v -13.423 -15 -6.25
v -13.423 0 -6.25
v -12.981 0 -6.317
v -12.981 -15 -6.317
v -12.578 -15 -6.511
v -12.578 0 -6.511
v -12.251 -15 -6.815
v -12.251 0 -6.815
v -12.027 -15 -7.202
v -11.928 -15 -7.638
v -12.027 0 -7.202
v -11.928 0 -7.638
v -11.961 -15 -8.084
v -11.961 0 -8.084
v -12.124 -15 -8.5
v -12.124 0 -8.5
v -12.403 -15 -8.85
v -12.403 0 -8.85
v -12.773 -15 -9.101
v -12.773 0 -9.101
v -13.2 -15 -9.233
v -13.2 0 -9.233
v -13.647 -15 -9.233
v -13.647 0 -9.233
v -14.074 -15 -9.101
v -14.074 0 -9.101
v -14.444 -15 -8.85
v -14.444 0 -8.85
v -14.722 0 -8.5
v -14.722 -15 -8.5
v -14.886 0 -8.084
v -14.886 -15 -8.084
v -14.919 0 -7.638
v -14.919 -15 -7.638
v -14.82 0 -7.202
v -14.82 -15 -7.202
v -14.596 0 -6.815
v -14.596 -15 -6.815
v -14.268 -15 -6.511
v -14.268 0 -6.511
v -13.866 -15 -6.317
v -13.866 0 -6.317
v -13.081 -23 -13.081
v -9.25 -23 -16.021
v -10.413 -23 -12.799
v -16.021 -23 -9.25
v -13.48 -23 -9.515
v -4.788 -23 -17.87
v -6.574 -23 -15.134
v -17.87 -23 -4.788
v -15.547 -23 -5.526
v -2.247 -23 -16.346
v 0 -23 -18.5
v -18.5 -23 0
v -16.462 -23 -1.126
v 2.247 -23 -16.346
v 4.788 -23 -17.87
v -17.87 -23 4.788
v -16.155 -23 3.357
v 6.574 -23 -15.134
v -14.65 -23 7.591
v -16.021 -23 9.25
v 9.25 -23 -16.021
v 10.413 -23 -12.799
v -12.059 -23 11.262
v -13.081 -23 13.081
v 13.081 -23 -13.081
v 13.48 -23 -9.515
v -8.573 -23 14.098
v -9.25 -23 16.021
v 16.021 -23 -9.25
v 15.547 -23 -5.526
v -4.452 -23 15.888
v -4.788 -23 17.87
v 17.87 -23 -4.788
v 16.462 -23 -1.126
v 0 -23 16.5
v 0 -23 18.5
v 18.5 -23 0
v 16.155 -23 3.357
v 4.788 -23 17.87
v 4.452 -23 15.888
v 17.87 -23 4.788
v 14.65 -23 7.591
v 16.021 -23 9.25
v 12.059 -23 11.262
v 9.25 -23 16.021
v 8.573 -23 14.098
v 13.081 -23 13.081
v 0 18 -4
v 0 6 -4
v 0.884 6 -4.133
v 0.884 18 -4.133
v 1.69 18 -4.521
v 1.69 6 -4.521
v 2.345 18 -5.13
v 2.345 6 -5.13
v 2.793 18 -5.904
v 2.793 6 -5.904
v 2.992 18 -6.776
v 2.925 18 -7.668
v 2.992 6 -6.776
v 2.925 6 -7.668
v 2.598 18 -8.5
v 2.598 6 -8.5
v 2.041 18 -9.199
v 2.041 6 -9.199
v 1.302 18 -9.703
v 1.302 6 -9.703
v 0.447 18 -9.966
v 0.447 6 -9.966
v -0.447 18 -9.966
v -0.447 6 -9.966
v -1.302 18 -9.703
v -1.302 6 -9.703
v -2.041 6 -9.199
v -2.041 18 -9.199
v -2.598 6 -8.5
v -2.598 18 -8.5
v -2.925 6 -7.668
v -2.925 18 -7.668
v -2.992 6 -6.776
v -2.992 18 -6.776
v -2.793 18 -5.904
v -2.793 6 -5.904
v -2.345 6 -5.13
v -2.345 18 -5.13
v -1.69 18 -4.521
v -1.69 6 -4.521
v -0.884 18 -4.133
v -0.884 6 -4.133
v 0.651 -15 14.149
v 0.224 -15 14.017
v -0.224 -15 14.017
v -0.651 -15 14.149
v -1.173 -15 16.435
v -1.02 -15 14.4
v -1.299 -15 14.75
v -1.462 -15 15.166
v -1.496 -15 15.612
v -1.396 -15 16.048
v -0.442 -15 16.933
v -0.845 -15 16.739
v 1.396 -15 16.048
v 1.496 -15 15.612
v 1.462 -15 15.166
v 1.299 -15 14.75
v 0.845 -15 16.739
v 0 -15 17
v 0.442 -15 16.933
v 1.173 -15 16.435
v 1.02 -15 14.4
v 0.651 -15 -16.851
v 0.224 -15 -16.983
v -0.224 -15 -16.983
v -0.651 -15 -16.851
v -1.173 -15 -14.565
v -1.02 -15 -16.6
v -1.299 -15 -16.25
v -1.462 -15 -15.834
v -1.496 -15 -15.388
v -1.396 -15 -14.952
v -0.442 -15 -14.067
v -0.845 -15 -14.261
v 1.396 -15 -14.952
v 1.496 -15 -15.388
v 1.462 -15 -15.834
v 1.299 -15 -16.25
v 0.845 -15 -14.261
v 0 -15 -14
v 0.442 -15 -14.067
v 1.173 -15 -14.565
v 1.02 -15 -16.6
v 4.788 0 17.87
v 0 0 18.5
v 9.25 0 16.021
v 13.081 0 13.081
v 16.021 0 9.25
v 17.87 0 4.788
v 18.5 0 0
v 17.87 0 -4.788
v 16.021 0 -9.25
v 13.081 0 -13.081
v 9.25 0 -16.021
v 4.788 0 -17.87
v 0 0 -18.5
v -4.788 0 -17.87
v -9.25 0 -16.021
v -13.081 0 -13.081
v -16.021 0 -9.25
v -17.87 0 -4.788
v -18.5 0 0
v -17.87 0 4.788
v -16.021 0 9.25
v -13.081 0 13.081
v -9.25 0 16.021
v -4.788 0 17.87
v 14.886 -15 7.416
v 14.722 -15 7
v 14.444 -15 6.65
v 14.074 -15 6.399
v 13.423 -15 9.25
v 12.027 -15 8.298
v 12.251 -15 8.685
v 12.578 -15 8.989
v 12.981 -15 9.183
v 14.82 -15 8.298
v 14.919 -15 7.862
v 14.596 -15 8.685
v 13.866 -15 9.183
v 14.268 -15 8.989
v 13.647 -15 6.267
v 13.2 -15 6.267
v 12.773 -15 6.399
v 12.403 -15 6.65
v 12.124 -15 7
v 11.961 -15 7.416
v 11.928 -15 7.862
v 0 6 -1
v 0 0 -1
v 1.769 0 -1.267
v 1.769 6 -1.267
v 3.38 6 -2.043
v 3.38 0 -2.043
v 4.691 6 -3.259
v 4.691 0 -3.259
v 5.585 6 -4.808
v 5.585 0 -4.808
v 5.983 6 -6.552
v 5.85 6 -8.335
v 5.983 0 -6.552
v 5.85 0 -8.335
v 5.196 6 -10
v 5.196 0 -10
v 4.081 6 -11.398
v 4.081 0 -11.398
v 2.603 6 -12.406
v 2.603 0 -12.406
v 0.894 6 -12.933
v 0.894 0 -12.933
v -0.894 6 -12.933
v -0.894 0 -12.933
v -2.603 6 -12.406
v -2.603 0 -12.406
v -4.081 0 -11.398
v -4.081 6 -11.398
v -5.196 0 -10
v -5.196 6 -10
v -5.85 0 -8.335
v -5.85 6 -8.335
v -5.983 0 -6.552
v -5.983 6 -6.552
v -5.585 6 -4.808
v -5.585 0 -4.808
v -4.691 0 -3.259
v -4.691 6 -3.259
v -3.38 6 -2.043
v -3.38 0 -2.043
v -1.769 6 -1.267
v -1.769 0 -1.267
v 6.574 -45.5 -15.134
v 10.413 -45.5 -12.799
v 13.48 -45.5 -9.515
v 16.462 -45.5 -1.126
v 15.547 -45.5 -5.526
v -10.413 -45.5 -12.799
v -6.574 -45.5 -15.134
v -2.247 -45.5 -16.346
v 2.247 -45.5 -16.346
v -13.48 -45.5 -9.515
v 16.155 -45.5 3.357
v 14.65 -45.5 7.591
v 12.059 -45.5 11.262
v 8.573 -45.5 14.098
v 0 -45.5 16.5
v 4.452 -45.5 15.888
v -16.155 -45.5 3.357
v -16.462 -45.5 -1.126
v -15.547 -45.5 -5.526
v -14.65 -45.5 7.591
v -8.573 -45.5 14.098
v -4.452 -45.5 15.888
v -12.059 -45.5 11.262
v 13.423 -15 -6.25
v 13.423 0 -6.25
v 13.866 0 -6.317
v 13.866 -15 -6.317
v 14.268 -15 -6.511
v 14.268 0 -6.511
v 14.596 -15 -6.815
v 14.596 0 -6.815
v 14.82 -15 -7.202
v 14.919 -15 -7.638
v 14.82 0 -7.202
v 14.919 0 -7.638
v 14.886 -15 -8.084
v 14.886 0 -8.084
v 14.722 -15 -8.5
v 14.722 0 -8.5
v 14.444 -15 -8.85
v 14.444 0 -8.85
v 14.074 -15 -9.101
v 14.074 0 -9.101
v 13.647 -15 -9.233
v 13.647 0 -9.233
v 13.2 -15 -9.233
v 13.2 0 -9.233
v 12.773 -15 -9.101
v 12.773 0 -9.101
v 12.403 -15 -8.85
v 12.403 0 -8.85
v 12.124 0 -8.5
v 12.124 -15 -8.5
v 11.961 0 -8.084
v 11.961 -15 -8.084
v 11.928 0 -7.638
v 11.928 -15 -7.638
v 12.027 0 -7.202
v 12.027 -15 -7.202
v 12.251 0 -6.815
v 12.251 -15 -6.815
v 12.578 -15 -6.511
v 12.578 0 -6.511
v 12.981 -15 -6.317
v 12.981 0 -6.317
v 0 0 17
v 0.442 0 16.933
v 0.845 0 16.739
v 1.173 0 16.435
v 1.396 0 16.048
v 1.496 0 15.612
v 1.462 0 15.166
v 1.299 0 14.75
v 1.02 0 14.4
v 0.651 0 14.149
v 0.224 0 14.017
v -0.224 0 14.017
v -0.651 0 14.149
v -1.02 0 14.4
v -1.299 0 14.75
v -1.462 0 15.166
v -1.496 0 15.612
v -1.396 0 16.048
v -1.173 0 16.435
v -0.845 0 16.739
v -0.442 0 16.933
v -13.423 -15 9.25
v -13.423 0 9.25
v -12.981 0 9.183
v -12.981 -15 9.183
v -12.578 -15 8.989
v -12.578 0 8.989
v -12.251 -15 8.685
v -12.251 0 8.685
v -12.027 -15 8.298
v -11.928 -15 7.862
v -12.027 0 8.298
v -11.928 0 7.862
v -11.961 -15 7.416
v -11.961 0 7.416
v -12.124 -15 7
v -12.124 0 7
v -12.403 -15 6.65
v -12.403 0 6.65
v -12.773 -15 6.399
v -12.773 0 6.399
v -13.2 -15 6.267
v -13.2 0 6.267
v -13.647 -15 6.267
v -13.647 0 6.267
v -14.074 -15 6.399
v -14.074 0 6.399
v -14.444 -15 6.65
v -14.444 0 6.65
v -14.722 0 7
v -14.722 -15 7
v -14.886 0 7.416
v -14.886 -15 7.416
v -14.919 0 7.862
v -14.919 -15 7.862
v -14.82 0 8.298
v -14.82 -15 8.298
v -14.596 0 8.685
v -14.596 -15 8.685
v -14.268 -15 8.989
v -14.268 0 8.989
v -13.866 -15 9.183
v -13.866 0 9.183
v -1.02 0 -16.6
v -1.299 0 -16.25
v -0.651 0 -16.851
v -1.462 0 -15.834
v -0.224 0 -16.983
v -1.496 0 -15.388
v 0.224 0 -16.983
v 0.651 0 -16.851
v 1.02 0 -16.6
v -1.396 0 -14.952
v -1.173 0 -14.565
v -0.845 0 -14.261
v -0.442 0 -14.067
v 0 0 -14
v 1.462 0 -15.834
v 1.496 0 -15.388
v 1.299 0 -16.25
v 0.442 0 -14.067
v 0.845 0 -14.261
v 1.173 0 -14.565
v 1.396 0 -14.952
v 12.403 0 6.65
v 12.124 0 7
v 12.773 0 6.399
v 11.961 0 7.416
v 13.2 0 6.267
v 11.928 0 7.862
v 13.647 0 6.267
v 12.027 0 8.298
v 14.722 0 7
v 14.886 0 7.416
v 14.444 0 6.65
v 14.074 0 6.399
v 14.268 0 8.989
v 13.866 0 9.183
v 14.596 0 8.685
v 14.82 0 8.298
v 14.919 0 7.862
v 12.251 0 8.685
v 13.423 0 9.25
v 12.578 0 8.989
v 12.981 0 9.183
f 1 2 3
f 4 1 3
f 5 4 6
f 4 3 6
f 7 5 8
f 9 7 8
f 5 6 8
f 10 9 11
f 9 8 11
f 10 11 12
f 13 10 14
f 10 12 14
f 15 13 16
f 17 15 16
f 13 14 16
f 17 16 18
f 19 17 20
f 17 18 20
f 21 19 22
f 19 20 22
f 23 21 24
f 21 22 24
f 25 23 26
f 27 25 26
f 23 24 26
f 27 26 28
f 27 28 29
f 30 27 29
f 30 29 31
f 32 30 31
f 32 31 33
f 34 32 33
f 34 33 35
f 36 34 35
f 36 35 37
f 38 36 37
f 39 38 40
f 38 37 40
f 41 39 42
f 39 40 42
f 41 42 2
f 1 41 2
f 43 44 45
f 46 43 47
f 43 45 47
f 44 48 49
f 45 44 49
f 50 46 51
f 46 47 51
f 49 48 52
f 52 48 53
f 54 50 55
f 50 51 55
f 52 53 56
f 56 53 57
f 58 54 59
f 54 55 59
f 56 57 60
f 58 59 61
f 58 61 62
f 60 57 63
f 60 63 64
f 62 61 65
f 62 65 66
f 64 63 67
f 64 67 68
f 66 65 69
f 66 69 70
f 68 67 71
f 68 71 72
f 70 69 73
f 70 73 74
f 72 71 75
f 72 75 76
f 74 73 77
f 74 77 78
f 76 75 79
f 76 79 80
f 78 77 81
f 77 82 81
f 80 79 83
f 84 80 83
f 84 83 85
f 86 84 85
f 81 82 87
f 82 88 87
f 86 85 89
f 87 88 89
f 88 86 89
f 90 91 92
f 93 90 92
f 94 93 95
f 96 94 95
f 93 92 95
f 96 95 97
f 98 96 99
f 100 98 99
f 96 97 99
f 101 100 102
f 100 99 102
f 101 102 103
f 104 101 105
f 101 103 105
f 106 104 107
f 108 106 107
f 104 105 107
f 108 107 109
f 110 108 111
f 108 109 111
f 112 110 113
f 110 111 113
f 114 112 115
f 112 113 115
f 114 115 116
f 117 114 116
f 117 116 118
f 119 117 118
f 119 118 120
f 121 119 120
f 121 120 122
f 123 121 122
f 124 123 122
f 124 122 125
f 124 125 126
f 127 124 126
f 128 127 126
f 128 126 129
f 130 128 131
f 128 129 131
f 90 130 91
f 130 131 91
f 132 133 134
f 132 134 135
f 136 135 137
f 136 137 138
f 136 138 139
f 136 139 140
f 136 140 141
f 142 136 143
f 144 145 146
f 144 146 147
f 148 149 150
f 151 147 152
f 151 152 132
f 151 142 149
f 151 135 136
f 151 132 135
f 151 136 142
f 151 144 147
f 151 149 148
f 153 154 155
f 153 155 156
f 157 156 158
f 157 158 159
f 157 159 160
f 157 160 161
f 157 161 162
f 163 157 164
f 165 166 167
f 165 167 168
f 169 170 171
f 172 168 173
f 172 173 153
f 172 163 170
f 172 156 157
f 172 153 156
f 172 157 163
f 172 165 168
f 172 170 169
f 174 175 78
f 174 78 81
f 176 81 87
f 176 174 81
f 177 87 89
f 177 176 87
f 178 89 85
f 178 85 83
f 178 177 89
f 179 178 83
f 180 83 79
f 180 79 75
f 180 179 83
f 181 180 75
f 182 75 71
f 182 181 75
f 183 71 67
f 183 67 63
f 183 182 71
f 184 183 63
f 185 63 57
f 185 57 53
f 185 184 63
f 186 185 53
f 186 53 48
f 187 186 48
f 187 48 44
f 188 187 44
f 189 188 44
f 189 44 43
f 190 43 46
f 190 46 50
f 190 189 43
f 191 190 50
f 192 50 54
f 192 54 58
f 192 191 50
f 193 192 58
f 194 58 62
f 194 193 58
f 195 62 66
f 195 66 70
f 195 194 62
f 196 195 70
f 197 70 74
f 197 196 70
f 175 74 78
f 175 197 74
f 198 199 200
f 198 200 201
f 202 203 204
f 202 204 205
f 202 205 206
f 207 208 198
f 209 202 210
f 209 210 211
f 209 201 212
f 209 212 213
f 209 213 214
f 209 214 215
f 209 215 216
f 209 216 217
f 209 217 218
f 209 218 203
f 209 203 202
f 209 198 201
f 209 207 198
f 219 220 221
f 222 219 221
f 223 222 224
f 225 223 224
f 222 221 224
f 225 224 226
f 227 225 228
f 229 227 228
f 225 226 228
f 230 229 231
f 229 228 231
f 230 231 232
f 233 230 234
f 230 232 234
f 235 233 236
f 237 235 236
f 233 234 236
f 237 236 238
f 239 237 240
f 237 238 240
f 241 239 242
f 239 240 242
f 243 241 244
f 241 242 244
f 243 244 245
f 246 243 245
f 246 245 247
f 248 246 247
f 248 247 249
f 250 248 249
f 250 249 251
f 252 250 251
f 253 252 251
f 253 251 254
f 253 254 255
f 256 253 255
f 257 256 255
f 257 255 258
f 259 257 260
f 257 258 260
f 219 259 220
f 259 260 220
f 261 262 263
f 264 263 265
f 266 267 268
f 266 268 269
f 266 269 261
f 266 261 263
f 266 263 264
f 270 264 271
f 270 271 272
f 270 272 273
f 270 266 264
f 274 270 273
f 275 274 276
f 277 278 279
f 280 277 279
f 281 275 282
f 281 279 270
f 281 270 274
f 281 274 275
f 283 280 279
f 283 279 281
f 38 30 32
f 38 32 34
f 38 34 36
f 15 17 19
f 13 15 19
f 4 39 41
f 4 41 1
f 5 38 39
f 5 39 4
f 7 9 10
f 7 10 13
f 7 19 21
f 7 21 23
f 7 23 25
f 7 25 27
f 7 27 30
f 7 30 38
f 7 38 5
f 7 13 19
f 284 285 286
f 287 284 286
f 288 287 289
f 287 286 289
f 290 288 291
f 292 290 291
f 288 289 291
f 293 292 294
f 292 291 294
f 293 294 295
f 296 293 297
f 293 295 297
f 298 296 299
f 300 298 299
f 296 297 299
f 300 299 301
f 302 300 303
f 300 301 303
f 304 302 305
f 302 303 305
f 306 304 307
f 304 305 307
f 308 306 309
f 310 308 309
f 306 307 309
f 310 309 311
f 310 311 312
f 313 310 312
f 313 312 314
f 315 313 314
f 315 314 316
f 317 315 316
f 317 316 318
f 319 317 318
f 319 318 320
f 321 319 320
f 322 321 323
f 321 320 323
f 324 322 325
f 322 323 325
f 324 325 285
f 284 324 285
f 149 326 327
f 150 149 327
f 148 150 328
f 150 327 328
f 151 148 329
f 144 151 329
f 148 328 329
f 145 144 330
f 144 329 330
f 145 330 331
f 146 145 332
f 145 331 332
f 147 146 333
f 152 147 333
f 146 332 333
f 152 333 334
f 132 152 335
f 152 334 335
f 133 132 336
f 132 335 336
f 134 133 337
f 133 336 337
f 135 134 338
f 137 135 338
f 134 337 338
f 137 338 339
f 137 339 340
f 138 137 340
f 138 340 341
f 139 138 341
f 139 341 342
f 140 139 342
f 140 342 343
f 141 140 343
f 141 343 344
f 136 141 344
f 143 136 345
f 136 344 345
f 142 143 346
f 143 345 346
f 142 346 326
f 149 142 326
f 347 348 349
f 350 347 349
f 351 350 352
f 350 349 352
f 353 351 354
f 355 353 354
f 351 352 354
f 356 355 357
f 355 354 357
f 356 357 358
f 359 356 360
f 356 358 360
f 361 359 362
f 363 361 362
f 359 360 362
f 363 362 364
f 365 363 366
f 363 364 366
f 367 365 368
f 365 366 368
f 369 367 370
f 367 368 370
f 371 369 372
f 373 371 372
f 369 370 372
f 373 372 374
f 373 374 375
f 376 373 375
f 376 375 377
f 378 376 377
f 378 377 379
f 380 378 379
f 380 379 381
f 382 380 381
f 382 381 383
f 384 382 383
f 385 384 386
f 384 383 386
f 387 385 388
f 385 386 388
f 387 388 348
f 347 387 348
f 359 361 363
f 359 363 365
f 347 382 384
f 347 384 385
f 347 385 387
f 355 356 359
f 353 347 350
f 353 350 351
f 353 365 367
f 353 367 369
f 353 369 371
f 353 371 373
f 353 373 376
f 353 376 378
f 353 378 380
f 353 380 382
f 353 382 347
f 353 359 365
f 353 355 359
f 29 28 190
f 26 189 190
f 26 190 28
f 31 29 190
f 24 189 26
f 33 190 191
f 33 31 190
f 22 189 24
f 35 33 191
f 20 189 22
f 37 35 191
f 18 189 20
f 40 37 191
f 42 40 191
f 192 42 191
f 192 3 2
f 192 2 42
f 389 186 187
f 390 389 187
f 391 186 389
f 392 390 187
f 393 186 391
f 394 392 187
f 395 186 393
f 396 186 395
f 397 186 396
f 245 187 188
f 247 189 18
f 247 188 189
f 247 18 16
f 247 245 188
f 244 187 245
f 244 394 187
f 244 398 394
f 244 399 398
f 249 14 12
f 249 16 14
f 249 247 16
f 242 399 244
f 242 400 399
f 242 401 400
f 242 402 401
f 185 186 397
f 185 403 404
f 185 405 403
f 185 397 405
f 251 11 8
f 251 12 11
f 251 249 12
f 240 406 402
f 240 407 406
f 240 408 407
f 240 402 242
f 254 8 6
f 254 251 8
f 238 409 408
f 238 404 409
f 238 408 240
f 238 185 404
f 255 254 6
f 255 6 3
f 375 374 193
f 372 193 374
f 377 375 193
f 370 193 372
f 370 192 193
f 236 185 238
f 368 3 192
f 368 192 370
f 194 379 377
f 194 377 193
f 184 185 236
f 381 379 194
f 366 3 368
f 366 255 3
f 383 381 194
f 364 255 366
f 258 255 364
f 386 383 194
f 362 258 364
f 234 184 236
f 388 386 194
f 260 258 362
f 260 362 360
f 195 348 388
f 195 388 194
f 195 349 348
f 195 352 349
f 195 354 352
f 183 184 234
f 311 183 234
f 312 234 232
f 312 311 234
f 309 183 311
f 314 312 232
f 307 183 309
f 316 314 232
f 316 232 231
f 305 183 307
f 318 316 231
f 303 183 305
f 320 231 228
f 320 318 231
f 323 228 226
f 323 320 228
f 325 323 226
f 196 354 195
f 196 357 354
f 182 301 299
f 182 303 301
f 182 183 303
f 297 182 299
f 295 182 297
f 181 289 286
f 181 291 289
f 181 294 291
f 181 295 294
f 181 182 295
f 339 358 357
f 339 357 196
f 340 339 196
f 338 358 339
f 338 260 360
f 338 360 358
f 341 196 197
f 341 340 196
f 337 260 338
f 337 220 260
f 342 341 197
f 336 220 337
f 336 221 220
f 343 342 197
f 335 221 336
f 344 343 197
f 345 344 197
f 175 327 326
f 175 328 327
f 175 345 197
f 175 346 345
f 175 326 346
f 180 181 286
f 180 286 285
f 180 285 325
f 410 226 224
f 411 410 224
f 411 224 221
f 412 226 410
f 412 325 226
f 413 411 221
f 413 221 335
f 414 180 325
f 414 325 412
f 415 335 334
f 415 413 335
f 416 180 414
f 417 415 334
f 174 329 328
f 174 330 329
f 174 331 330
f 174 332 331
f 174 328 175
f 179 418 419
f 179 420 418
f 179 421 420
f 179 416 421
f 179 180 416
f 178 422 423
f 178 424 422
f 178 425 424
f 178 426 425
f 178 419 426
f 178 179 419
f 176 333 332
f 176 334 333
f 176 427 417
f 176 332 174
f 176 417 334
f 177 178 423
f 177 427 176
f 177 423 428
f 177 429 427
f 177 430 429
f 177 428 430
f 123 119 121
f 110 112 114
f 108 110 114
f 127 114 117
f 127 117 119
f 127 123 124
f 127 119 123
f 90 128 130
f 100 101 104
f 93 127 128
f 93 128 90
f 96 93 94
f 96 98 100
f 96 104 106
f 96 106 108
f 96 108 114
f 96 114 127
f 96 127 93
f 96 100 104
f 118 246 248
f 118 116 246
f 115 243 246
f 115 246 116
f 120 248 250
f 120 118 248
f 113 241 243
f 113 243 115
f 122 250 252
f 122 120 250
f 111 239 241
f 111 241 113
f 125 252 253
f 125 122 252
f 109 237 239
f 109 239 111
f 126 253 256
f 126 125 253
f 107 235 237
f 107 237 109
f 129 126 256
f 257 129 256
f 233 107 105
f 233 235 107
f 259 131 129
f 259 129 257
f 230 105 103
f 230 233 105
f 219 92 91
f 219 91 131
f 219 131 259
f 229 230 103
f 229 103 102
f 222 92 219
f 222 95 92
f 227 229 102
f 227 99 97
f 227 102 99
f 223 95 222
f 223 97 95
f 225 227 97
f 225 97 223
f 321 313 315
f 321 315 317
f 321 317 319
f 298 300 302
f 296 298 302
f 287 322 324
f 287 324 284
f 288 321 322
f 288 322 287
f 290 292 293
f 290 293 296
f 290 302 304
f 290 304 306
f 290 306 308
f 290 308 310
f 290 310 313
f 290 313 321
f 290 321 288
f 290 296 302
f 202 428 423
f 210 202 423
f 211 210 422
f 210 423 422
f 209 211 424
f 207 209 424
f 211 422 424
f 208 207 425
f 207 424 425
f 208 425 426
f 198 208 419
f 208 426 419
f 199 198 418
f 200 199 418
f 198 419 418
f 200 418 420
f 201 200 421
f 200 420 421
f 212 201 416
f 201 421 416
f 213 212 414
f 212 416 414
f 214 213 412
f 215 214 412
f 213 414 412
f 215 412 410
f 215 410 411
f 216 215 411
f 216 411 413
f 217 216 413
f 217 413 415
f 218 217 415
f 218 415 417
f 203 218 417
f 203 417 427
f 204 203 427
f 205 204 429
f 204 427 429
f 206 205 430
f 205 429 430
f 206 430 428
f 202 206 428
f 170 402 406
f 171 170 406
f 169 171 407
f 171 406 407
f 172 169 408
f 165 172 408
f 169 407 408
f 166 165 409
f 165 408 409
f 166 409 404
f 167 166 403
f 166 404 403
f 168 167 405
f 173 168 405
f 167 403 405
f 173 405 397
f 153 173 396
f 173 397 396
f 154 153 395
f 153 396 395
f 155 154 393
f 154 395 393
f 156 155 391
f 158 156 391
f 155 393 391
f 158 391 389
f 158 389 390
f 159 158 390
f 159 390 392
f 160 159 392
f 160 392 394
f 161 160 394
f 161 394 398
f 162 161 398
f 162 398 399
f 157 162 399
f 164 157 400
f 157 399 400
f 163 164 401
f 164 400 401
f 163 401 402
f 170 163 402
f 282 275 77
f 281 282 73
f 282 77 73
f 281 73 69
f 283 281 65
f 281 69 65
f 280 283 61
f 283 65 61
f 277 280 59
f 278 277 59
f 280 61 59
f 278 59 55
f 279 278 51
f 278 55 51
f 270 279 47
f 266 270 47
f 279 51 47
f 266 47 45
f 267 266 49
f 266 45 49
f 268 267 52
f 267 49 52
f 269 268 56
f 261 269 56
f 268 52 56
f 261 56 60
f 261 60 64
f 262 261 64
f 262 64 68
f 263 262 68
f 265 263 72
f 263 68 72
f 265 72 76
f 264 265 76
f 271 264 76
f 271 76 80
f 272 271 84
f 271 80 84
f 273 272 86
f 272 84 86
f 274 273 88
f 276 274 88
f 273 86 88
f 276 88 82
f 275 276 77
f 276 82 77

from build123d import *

# Parameters (mm, degrees)
SKETCH_1_R          = 18.5
EXTRUDE_1_DEPTH     = 23
SKETCH_3_R          = 16.5
EXTRUDE_2_DEPTH     = 22.5
SKETCH_4_R          = 1.5
CUT_EXTRUDE_1_DEPTH = 15
SKETCH_5_R          = 6
EXTRUDE_3_DEPTH     = 6
SKETCH_6_R          = 3
EXTRUDE_4_DEPTH     = 12


with BuildPart() as part:
    # 草图1 → 凸台-拉伸1 (new body)
    with BuildSketch(Plane(origin=(0, 0, 0), x_dir=(1, 0, 0), z_dir=(0, 1, 0))):
        with Locations(Location((0, 0, 0), (0, 0, 270))):
            Circle(SKETCH_1_R)
    extrude(amount=-EXTRUDE_1_DEPTH)

    # 草图3 → 凸台-拉伸2 (add)
    with BuildSketch(Plane.XZ.offset(23)):
        with Locations(Location((0, 0, 0), (0, 0, 90))):
            Circle(SKETCH_3_R)
    extrude(amount=EXTRUDE_2_DEPTH)

    # 草图4 → 切除-拉伸1 (cut)
    with BuildSketch(Plane(origin=(0, 0, 0), x_dir=(1, 0, 0), z_dir=(0, 1, 0))):
        with Locations(Location((0, 15.5, 0), (0, 0, 270))):
            Circle(SKETCH_4_R)
        with Locations(Location((13.423393759, 7.75, 0), (0, 0, 270))):
            Circle(SKETCH_4_R)
        with Locations(Location((13.423393759, -7.75, 0), (0, 0, 270))):
            Circle(SKETCH_4_R)
        with Locations(Location((0, -15.5, 0), (0, 0, 270))):
            Circle(SKETCH_4_R)
        with Locations(Location((-13.423393759, -7.75, 0), (0, 0, 270))):
            Circle(SKETCH_4_R)
        with Locations(Location((-13.423393759, 7.75, 0), (0, 0, 270))):
            Circle(SKETCH_4_R)
    extrude(amount=-CUT_EXTRUDE_1_DEPTH, mode=Mode.SUBTRACT)

    # 草图5 → 凸台-拉伸3 (add)
    with BuildSketch(Plane(origin=(0, 0, 0), x_dir=(1, 0, 0), z_dir=(0, 1, 0))):
        with Locations(Location((0, 7, 0), (0, 0, 270))):
            Circle(SKETCH_5_R)
    extrude(amount=EXTRUDE_3_DEPTH)

    # 草图6 → 凸台-拉伸4 (add)
    with BuildSketch(Plane(origin=(0, 6, 0), x_dir=(1, 0, 0), z_dir=(0, 1, 0))):
        with Locations(Location((0, 7, 0), (0, 0, 270))):
            Circle(SKETCH_6_R)
    extrude(amount=EXTRUDE_4_DEPTH)


solid = part.part
